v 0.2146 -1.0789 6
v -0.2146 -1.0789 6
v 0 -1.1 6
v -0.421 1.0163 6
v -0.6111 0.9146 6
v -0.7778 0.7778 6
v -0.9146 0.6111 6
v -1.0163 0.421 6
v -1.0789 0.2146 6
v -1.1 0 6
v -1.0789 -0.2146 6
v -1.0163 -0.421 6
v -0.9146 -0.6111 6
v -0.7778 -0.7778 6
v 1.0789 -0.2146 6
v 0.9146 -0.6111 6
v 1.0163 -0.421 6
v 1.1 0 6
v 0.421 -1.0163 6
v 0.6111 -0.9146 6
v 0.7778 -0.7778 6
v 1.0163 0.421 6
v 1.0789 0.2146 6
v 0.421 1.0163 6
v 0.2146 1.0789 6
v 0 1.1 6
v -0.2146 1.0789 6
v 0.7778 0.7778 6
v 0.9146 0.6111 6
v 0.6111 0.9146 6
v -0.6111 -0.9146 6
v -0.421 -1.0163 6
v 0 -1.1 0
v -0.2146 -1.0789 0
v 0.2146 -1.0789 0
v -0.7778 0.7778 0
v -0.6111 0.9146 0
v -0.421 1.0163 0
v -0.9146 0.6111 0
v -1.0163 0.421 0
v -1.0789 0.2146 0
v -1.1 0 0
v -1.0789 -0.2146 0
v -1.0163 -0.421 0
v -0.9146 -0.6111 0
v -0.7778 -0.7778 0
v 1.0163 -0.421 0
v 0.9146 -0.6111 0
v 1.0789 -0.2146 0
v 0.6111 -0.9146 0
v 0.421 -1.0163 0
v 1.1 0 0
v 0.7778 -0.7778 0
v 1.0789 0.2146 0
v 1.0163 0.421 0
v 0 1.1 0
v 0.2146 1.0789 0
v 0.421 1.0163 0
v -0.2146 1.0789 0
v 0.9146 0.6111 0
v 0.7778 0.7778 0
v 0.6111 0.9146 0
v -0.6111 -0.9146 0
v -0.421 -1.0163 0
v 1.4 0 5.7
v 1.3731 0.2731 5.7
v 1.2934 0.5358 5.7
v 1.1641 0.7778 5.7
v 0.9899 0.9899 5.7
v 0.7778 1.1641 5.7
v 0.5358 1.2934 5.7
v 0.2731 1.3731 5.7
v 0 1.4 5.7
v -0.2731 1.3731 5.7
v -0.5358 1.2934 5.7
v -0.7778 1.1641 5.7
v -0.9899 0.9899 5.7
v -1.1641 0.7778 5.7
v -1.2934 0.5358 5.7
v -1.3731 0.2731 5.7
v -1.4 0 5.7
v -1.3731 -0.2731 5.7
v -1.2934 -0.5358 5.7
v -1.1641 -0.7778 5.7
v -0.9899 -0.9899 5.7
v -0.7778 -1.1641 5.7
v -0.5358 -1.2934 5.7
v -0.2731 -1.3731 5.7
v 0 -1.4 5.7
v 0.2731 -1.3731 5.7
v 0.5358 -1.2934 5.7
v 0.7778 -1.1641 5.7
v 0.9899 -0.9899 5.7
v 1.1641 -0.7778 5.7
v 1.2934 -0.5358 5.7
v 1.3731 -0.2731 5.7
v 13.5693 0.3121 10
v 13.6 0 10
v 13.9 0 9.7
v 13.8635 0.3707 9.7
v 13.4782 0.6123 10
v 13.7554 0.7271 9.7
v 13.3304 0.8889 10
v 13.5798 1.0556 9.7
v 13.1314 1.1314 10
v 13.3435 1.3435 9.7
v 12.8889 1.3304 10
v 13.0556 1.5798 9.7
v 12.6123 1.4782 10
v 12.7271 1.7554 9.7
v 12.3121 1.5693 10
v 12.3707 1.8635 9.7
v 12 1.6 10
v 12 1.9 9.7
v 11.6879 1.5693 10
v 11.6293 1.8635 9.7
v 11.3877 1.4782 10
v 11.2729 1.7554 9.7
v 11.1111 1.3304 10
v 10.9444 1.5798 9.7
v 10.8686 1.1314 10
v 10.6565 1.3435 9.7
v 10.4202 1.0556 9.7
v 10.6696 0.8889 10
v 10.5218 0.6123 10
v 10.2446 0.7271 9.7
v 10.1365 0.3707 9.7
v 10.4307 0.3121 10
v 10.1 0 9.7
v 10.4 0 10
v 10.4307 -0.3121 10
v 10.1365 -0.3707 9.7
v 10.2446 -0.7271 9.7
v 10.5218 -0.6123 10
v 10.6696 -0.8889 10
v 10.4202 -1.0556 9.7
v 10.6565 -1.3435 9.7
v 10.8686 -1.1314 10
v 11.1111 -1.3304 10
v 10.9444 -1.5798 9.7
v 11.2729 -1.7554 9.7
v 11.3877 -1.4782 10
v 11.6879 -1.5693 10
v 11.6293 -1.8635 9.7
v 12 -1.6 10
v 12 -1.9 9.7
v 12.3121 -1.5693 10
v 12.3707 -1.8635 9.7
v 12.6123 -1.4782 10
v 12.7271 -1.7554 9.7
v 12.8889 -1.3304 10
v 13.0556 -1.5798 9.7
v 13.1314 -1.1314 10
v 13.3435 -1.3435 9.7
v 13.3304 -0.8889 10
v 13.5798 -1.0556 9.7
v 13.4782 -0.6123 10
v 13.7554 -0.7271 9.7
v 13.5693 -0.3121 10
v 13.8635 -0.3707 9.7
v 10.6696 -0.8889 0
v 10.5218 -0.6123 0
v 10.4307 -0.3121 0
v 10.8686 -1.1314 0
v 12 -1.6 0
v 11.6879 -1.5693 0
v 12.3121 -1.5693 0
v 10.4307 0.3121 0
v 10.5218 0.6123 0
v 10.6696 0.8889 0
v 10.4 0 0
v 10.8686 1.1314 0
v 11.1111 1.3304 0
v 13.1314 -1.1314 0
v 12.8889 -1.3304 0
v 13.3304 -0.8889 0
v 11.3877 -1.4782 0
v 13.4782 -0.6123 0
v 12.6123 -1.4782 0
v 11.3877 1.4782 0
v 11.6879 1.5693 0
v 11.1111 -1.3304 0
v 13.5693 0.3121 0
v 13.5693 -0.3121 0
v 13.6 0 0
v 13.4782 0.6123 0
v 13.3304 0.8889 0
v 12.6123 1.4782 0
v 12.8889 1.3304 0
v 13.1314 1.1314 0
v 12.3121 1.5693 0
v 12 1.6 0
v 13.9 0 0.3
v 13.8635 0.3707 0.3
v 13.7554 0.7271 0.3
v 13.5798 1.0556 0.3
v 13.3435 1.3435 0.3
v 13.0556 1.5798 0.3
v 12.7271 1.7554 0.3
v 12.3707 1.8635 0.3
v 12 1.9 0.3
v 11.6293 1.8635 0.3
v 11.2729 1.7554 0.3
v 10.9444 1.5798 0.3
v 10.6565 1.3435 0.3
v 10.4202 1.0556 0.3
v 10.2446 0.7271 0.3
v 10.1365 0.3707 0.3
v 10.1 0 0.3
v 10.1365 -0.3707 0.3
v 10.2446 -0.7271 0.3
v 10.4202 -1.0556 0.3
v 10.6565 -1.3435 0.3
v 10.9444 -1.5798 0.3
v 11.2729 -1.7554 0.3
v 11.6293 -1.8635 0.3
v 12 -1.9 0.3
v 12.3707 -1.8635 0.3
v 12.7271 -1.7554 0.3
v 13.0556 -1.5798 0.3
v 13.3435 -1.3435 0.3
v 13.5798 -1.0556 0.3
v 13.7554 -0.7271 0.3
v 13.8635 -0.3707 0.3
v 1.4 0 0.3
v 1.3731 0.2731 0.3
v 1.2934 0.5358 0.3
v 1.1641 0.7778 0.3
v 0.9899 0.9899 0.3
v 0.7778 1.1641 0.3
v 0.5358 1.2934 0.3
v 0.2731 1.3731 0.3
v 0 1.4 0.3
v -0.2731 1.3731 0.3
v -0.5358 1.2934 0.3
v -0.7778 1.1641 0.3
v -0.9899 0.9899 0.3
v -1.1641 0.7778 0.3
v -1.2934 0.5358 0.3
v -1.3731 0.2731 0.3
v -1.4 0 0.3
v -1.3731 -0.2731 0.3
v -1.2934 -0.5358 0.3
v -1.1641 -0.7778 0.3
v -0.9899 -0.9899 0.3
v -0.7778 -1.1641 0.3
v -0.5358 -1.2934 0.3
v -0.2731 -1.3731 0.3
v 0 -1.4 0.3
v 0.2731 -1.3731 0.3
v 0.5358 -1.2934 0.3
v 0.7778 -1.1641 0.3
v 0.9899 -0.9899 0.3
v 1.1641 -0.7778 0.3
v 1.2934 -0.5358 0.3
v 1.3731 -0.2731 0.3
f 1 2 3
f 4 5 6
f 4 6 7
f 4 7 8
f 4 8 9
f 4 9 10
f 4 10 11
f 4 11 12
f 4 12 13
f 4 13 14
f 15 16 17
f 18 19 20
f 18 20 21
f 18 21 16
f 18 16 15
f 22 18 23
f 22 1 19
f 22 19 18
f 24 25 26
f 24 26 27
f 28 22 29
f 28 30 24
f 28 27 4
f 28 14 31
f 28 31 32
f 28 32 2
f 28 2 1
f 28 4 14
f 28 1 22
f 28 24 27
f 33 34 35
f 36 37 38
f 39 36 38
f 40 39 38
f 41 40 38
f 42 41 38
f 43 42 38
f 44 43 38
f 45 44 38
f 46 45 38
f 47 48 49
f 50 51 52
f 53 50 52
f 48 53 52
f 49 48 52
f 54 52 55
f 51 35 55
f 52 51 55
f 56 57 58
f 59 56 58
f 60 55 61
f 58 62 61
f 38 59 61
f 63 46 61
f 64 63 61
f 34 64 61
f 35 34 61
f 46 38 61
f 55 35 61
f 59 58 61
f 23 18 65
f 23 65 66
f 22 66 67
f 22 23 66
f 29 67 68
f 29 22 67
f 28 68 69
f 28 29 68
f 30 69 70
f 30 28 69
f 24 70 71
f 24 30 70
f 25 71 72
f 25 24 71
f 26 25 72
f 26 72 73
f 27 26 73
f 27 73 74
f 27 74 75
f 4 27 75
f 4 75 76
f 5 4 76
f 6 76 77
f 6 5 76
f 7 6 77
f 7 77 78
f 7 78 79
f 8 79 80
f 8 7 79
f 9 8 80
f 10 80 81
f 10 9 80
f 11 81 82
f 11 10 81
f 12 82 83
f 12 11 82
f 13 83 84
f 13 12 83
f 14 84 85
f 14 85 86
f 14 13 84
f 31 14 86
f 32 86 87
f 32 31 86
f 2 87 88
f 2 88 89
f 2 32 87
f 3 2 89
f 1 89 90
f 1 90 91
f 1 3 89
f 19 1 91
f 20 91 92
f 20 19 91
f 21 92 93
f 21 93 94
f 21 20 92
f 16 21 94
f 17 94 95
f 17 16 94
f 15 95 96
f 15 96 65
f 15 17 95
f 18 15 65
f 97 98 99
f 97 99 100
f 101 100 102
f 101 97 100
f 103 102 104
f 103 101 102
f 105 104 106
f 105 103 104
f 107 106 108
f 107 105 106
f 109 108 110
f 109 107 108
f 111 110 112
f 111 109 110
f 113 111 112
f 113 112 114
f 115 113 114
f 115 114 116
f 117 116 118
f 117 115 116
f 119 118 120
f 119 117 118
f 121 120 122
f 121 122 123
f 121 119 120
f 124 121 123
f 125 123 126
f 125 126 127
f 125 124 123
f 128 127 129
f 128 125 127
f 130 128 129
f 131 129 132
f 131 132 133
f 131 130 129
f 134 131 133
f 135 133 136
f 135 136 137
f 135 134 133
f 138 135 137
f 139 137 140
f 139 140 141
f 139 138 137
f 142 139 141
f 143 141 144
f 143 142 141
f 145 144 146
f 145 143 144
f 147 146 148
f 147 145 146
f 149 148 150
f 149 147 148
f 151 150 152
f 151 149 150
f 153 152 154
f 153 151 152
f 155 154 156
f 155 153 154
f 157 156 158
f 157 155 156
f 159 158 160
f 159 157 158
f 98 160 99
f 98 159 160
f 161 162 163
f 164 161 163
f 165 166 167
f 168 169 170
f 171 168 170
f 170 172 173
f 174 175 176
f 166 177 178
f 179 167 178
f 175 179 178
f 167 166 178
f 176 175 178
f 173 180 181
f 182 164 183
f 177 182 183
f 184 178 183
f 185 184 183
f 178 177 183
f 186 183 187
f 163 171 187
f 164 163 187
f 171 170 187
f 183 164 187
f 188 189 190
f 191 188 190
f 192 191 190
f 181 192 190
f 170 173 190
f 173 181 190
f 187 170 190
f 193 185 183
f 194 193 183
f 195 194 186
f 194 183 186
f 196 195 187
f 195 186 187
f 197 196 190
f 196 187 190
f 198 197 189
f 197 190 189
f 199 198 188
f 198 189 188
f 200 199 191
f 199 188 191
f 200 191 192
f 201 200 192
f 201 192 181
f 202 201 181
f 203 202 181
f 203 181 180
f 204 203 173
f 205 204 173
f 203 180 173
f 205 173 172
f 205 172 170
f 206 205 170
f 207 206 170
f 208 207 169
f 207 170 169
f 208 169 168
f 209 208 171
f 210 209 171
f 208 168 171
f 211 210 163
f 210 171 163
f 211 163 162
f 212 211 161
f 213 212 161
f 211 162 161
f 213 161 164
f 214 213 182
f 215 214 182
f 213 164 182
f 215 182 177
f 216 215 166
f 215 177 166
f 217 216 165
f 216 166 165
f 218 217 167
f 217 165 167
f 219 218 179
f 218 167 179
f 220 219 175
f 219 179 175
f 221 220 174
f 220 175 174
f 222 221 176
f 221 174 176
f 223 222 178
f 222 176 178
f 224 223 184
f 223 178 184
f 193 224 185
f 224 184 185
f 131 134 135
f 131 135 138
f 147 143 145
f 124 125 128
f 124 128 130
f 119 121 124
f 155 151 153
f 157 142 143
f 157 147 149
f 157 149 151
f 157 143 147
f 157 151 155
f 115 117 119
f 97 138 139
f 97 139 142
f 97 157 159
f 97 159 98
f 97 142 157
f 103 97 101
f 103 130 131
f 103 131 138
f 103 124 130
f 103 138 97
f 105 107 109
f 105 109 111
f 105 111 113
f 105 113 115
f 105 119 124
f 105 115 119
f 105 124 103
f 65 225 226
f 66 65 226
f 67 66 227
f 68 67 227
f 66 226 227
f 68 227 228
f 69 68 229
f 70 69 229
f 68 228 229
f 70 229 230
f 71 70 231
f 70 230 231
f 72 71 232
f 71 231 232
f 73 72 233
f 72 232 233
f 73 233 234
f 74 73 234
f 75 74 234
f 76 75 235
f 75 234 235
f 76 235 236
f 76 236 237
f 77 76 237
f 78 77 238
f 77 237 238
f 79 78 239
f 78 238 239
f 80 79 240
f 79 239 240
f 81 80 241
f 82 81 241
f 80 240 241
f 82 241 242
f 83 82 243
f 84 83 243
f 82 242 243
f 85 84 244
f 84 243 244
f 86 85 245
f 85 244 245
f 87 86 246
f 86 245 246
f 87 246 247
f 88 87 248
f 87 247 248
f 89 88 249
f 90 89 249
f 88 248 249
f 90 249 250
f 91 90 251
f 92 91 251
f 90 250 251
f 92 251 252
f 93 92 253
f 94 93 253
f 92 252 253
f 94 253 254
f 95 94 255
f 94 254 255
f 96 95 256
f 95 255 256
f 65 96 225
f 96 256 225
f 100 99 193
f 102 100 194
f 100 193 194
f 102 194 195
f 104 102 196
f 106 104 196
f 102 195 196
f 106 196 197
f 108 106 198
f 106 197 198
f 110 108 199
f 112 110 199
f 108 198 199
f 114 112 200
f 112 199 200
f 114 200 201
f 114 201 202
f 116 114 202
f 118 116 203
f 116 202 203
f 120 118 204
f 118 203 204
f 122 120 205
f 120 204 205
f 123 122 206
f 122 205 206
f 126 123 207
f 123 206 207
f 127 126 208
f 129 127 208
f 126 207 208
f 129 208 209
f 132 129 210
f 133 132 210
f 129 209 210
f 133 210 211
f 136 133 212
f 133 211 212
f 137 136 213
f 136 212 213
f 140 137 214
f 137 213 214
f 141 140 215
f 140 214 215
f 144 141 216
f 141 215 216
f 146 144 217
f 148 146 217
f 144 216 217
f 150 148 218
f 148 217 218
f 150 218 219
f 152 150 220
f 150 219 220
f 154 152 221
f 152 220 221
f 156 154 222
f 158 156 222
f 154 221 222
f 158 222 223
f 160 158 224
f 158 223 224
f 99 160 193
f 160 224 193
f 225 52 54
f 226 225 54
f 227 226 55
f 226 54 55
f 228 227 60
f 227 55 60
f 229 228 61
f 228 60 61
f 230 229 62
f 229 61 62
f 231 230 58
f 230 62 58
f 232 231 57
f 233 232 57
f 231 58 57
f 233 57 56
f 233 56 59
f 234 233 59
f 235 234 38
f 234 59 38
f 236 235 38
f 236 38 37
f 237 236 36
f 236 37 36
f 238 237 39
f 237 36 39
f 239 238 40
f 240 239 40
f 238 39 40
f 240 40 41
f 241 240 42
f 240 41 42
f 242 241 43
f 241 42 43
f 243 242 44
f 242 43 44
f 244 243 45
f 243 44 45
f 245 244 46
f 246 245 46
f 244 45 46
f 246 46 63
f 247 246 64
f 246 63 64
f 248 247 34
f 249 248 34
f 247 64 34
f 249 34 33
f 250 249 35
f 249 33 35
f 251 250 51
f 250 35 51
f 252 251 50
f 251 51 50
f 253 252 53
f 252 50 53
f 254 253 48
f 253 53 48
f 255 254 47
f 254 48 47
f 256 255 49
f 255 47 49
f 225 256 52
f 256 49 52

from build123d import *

# Parameters (mm, degrees)
F0_R      = 1.9
F1_DEPTH  = 10
F0_R_2    = 1.4
F2_DEPTH  = 6
F3_SIZE   = 0.3
F3_2_SIZE = 0.3


with BuildPart() as f1:
    # F0 (on Top) → F1 (new body)
    with BuildSketch(Plane.XY):
        with Locations((12, 0)):
            Circle(F0_R)
    extrude(amount=F1_DEPTH)

    # F3
    f3_edges = [f1.edges().sort_by_distance(p)[0] for p in [
        (10.1, 0, 10),
        (10.1, 0, 0),
    ]]
    chamfer(f3_edges, length=F3_SIZE)


with BuildPart() as f2:
    # F0 (on Top) → F2 (new body)
    with BuildSketch(Plane.XY):
        Circle(F0_R_2)
    extrude(amount=F2_DEPTH)

    # F3#2
    f3_2_edges = [f2.edges().sort_by_distance(p)[0] for p in [
        (-1.4, 0, 6),
        (-1.4, 0, 0),
    ]]
    chamfer(f3_2_edges, length=F3_2_SIZE)


solid = Compound([f1.part, f2.part])
